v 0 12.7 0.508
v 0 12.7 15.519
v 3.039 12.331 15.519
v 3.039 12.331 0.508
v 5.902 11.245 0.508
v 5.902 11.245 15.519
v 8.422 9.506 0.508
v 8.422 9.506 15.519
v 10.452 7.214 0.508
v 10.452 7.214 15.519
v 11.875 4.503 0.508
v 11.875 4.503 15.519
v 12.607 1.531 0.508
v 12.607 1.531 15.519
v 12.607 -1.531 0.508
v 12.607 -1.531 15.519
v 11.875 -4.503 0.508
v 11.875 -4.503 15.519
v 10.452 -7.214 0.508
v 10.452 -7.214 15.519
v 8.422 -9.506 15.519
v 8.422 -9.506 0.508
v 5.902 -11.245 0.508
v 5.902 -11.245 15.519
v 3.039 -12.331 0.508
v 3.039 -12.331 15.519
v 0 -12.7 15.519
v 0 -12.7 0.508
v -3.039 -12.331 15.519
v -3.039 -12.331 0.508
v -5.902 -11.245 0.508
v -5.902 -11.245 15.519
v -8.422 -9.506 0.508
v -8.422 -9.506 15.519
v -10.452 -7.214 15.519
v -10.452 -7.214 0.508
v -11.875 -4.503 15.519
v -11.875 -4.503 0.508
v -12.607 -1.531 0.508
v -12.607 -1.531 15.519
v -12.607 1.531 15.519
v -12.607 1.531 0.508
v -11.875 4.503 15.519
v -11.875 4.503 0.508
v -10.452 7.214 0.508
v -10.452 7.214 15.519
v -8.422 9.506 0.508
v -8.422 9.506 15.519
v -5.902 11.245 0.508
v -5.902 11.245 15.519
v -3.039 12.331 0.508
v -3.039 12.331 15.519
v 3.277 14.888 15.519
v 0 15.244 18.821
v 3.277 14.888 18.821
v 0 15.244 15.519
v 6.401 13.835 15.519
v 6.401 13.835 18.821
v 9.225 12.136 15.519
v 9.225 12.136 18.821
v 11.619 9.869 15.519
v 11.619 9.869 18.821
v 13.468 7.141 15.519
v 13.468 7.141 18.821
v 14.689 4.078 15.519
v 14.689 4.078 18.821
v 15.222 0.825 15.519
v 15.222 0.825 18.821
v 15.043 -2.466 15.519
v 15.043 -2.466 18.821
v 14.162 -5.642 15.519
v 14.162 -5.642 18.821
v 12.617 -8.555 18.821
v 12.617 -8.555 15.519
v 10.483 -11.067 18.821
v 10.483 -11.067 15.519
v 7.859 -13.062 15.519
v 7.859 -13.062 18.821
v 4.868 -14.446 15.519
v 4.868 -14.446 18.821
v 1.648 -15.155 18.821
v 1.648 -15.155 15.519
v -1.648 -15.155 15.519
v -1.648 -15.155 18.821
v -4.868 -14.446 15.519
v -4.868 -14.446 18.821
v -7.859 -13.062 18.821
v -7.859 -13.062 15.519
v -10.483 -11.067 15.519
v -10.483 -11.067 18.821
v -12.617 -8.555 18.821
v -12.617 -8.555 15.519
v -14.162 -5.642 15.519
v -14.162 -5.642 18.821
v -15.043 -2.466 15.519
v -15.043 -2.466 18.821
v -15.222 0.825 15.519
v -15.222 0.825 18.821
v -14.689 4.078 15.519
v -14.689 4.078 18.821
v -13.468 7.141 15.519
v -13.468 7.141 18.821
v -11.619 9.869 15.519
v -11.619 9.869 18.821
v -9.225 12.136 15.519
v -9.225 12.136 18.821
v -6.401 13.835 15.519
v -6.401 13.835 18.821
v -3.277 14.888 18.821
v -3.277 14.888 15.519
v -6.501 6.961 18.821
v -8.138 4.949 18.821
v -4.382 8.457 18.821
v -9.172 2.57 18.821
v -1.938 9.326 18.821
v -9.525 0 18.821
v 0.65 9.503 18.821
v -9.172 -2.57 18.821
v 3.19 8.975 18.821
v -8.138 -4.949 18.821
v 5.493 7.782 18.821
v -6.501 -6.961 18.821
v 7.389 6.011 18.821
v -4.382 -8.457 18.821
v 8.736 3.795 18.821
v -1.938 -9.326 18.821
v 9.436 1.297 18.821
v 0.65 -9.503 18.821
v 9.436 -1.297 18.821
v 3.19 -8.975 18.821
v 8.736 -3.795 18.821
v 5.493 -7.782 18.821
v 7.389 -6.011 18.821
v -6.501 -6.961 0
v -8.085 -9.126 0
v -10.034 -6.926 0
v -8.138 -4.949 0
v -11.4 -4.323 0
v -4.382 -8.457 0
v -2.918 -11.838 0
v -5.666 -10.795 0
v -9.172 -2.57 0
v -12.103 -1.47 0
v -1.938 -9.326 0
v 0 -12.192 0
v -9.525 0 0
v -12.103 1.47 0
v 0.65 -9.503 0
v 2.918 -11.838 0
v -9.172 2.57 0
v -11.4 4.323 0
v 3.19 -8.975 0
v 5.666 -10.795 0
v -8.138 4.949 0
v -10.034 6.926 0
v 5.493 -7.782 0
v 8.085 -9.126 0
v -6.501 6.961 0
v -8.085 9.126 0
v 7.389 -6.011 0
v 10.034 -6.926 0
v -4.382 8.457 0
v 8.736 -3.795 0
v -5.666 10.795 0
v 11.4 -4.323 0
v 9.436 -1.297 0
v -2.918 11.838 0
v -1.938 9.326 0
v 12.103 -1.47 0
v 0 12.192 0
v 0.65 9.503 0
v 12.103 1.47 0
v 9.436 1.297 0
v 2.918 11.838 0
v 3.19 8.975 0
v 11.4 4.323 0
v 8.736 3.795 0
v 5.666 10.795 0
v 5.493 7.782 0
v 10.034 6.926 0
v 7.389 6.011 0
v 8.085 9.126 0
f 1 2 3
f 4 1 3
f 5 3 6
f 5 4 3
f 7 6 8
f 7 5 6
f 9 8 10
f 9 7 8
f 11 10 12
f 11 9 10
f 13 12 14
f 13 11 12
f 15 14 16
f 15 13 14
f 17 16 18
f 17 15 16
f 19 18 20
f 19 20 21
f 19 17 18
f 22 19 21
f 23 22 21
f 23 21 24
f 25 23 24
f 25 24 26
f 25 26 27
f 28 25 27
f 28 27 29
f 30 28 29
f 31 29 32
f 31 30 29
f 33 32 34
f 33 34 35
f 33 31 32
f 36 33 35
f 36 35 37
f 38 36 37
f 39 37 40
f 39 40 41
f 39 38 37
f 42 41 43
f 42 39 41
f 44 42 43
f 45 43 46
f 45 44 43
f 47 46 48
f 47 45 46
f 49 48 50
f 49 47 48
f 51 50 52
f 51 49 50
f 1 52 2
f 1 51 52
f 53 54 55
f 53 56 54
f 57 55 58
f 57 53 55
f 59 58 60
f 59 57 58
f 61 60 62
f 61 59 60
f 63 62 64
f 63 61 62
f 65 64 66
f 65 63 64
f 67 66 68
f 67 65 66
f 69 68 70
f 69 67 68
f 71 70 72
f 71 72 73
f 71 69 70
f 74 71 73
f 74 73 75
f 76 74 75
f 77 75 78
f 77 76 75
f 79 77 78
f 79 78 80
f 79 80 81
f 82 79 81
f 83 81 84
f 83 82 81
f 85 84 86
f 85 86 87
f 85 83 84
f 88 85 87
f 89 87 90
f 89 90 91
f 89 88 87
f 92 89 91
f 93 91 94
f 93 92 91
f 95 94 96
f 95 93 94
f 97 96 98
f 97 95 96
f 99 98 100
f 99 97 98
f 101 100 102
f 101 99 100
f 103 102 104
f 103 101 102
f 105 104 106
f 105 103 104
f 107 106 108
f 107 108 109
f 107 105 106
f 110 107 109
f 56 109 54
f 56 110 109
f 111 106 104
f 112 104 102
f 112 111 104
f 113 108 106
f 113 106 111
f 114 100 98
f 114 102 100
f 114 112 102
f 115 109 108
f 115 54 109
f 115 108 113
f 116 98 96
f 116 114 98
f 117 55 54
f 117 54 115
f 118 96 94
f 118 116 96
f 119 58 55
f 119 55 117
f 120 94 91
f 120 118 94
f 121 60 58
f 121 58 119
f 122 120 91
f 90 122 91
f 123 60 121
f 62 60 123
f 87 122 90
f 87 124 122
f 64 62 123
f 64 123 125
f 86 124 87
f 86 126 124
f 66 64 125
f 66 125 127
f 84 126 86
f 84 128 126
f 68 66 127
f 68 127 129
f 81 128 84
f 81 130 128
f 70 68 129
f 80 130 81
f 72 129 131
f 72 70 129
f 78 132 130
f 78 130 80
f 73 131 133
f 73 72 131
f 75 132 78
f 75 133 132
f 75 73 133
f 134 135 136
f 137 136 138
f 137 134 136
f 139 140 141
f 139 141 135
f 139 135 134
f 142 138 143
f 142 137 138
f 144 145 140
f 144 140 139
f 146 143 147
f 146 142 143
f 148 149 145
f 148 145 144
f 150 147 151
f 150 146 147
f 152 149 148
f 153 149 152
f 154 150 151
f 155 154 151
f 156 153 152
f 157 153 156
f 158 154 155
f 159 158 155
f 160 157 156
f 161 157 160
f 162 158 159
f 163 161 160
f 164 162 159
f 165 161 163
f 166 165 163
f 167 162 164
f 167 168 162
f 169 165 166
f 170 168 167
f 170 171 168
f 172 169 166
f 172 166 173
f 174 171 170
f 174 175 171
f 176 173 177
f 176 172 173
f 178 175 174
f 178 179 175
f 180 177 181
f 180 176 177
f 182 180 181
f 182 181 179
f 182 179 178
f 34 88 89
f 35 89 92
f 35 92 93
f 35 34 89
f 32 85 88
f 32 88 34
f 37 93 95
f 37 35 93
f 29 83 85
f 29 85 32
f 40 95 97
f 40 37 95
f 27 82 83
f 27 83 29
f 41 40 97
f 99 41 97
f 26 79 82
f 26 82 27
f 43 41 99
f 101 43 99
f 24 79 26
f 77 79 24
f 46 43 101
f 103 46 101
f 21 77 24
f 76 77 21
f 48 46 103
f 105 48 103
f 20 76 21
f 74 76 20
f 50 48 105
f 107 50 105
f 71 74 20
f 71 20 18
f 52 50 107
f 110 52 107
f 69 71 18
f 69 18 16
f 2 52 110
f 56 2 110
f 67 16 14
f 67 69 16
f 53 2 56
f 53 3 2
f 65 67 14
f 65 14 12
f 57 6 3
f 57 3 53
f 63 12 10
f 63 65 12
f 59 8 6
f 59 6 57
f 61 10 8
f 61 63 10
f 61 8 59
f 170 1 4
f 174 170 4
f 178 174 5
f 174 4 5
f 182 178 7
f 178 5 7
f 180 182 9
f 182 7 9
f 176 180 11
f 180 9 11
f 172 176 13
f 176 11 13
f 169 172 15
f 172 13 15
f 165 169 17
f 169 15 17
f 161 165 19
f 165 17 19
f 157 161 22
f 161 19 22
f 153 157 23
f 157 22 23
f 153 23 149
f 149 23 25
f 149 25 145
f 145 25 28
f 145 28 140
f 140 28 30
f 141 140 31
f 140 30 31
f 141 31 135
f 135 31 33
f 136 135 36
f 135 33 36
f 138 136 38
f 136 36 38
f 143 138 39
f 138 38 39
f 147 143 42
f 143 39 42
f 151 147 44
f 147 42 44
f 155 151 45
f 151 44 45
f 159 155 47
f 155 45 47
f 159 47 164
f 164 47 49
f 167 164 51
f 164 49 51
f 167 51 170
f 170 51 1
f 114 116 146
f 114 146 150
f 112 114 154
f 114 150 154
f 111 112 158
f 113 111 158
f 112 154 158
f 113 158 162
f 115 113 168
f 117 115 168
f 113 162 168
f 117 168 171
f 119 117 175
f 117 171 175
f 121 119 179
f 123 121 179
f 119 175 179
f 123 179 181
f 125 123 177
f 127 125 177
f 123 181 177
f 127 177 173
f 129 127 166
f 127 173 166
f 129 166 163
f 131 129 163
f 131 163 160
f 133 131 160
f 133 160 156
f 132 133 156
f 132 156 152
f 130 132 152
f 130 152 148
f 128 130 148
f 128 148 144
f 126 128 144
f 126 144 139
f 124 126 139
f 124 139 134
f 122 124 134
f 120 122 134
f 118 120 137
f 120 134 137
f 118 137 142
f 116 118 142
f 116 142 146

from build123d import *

# Parameters (mm, degrees)
F_1_4_0_75_DIAMETER_HOLE1_D = 19.05
CHAMFER2_SIZE               = 0.508


with BuildPart() as part:
    # Sketch2 → Revolve2 (revolve)
    with BuildSketch(Plane(origin=(0, 0, 0), x_dir=(0, 0, -1), z_dir=(1, 0, 0))):
        Polygon((0, 0), (-18.8214, 0), (-18.8214, 15.244233333), (-15.5194, 15.244233333), (-15.5194, 12.7), (0, 12.7), align=None)
    revolve(axis=Axis((0, 0, 0), (0, 0, -1)))

    # 1/4 (0.75) Diameter Hole1 (through all)
    with Locations(Plane.XY.offset(18.8214)):
        with Locations((0, 0)):
            Hole(F_1_4_0_75_DIAMETER_HOLE1_D / 2)

    # Chamfer2
    chamfer2_edges = [part.edges().sort_by_distance(p)[0] for p in [
        (0, -12.7, 0),
    ]]
    chamfer(chamfer2_edges, length=CHAMFER2_SIZE)


solid = part.part
